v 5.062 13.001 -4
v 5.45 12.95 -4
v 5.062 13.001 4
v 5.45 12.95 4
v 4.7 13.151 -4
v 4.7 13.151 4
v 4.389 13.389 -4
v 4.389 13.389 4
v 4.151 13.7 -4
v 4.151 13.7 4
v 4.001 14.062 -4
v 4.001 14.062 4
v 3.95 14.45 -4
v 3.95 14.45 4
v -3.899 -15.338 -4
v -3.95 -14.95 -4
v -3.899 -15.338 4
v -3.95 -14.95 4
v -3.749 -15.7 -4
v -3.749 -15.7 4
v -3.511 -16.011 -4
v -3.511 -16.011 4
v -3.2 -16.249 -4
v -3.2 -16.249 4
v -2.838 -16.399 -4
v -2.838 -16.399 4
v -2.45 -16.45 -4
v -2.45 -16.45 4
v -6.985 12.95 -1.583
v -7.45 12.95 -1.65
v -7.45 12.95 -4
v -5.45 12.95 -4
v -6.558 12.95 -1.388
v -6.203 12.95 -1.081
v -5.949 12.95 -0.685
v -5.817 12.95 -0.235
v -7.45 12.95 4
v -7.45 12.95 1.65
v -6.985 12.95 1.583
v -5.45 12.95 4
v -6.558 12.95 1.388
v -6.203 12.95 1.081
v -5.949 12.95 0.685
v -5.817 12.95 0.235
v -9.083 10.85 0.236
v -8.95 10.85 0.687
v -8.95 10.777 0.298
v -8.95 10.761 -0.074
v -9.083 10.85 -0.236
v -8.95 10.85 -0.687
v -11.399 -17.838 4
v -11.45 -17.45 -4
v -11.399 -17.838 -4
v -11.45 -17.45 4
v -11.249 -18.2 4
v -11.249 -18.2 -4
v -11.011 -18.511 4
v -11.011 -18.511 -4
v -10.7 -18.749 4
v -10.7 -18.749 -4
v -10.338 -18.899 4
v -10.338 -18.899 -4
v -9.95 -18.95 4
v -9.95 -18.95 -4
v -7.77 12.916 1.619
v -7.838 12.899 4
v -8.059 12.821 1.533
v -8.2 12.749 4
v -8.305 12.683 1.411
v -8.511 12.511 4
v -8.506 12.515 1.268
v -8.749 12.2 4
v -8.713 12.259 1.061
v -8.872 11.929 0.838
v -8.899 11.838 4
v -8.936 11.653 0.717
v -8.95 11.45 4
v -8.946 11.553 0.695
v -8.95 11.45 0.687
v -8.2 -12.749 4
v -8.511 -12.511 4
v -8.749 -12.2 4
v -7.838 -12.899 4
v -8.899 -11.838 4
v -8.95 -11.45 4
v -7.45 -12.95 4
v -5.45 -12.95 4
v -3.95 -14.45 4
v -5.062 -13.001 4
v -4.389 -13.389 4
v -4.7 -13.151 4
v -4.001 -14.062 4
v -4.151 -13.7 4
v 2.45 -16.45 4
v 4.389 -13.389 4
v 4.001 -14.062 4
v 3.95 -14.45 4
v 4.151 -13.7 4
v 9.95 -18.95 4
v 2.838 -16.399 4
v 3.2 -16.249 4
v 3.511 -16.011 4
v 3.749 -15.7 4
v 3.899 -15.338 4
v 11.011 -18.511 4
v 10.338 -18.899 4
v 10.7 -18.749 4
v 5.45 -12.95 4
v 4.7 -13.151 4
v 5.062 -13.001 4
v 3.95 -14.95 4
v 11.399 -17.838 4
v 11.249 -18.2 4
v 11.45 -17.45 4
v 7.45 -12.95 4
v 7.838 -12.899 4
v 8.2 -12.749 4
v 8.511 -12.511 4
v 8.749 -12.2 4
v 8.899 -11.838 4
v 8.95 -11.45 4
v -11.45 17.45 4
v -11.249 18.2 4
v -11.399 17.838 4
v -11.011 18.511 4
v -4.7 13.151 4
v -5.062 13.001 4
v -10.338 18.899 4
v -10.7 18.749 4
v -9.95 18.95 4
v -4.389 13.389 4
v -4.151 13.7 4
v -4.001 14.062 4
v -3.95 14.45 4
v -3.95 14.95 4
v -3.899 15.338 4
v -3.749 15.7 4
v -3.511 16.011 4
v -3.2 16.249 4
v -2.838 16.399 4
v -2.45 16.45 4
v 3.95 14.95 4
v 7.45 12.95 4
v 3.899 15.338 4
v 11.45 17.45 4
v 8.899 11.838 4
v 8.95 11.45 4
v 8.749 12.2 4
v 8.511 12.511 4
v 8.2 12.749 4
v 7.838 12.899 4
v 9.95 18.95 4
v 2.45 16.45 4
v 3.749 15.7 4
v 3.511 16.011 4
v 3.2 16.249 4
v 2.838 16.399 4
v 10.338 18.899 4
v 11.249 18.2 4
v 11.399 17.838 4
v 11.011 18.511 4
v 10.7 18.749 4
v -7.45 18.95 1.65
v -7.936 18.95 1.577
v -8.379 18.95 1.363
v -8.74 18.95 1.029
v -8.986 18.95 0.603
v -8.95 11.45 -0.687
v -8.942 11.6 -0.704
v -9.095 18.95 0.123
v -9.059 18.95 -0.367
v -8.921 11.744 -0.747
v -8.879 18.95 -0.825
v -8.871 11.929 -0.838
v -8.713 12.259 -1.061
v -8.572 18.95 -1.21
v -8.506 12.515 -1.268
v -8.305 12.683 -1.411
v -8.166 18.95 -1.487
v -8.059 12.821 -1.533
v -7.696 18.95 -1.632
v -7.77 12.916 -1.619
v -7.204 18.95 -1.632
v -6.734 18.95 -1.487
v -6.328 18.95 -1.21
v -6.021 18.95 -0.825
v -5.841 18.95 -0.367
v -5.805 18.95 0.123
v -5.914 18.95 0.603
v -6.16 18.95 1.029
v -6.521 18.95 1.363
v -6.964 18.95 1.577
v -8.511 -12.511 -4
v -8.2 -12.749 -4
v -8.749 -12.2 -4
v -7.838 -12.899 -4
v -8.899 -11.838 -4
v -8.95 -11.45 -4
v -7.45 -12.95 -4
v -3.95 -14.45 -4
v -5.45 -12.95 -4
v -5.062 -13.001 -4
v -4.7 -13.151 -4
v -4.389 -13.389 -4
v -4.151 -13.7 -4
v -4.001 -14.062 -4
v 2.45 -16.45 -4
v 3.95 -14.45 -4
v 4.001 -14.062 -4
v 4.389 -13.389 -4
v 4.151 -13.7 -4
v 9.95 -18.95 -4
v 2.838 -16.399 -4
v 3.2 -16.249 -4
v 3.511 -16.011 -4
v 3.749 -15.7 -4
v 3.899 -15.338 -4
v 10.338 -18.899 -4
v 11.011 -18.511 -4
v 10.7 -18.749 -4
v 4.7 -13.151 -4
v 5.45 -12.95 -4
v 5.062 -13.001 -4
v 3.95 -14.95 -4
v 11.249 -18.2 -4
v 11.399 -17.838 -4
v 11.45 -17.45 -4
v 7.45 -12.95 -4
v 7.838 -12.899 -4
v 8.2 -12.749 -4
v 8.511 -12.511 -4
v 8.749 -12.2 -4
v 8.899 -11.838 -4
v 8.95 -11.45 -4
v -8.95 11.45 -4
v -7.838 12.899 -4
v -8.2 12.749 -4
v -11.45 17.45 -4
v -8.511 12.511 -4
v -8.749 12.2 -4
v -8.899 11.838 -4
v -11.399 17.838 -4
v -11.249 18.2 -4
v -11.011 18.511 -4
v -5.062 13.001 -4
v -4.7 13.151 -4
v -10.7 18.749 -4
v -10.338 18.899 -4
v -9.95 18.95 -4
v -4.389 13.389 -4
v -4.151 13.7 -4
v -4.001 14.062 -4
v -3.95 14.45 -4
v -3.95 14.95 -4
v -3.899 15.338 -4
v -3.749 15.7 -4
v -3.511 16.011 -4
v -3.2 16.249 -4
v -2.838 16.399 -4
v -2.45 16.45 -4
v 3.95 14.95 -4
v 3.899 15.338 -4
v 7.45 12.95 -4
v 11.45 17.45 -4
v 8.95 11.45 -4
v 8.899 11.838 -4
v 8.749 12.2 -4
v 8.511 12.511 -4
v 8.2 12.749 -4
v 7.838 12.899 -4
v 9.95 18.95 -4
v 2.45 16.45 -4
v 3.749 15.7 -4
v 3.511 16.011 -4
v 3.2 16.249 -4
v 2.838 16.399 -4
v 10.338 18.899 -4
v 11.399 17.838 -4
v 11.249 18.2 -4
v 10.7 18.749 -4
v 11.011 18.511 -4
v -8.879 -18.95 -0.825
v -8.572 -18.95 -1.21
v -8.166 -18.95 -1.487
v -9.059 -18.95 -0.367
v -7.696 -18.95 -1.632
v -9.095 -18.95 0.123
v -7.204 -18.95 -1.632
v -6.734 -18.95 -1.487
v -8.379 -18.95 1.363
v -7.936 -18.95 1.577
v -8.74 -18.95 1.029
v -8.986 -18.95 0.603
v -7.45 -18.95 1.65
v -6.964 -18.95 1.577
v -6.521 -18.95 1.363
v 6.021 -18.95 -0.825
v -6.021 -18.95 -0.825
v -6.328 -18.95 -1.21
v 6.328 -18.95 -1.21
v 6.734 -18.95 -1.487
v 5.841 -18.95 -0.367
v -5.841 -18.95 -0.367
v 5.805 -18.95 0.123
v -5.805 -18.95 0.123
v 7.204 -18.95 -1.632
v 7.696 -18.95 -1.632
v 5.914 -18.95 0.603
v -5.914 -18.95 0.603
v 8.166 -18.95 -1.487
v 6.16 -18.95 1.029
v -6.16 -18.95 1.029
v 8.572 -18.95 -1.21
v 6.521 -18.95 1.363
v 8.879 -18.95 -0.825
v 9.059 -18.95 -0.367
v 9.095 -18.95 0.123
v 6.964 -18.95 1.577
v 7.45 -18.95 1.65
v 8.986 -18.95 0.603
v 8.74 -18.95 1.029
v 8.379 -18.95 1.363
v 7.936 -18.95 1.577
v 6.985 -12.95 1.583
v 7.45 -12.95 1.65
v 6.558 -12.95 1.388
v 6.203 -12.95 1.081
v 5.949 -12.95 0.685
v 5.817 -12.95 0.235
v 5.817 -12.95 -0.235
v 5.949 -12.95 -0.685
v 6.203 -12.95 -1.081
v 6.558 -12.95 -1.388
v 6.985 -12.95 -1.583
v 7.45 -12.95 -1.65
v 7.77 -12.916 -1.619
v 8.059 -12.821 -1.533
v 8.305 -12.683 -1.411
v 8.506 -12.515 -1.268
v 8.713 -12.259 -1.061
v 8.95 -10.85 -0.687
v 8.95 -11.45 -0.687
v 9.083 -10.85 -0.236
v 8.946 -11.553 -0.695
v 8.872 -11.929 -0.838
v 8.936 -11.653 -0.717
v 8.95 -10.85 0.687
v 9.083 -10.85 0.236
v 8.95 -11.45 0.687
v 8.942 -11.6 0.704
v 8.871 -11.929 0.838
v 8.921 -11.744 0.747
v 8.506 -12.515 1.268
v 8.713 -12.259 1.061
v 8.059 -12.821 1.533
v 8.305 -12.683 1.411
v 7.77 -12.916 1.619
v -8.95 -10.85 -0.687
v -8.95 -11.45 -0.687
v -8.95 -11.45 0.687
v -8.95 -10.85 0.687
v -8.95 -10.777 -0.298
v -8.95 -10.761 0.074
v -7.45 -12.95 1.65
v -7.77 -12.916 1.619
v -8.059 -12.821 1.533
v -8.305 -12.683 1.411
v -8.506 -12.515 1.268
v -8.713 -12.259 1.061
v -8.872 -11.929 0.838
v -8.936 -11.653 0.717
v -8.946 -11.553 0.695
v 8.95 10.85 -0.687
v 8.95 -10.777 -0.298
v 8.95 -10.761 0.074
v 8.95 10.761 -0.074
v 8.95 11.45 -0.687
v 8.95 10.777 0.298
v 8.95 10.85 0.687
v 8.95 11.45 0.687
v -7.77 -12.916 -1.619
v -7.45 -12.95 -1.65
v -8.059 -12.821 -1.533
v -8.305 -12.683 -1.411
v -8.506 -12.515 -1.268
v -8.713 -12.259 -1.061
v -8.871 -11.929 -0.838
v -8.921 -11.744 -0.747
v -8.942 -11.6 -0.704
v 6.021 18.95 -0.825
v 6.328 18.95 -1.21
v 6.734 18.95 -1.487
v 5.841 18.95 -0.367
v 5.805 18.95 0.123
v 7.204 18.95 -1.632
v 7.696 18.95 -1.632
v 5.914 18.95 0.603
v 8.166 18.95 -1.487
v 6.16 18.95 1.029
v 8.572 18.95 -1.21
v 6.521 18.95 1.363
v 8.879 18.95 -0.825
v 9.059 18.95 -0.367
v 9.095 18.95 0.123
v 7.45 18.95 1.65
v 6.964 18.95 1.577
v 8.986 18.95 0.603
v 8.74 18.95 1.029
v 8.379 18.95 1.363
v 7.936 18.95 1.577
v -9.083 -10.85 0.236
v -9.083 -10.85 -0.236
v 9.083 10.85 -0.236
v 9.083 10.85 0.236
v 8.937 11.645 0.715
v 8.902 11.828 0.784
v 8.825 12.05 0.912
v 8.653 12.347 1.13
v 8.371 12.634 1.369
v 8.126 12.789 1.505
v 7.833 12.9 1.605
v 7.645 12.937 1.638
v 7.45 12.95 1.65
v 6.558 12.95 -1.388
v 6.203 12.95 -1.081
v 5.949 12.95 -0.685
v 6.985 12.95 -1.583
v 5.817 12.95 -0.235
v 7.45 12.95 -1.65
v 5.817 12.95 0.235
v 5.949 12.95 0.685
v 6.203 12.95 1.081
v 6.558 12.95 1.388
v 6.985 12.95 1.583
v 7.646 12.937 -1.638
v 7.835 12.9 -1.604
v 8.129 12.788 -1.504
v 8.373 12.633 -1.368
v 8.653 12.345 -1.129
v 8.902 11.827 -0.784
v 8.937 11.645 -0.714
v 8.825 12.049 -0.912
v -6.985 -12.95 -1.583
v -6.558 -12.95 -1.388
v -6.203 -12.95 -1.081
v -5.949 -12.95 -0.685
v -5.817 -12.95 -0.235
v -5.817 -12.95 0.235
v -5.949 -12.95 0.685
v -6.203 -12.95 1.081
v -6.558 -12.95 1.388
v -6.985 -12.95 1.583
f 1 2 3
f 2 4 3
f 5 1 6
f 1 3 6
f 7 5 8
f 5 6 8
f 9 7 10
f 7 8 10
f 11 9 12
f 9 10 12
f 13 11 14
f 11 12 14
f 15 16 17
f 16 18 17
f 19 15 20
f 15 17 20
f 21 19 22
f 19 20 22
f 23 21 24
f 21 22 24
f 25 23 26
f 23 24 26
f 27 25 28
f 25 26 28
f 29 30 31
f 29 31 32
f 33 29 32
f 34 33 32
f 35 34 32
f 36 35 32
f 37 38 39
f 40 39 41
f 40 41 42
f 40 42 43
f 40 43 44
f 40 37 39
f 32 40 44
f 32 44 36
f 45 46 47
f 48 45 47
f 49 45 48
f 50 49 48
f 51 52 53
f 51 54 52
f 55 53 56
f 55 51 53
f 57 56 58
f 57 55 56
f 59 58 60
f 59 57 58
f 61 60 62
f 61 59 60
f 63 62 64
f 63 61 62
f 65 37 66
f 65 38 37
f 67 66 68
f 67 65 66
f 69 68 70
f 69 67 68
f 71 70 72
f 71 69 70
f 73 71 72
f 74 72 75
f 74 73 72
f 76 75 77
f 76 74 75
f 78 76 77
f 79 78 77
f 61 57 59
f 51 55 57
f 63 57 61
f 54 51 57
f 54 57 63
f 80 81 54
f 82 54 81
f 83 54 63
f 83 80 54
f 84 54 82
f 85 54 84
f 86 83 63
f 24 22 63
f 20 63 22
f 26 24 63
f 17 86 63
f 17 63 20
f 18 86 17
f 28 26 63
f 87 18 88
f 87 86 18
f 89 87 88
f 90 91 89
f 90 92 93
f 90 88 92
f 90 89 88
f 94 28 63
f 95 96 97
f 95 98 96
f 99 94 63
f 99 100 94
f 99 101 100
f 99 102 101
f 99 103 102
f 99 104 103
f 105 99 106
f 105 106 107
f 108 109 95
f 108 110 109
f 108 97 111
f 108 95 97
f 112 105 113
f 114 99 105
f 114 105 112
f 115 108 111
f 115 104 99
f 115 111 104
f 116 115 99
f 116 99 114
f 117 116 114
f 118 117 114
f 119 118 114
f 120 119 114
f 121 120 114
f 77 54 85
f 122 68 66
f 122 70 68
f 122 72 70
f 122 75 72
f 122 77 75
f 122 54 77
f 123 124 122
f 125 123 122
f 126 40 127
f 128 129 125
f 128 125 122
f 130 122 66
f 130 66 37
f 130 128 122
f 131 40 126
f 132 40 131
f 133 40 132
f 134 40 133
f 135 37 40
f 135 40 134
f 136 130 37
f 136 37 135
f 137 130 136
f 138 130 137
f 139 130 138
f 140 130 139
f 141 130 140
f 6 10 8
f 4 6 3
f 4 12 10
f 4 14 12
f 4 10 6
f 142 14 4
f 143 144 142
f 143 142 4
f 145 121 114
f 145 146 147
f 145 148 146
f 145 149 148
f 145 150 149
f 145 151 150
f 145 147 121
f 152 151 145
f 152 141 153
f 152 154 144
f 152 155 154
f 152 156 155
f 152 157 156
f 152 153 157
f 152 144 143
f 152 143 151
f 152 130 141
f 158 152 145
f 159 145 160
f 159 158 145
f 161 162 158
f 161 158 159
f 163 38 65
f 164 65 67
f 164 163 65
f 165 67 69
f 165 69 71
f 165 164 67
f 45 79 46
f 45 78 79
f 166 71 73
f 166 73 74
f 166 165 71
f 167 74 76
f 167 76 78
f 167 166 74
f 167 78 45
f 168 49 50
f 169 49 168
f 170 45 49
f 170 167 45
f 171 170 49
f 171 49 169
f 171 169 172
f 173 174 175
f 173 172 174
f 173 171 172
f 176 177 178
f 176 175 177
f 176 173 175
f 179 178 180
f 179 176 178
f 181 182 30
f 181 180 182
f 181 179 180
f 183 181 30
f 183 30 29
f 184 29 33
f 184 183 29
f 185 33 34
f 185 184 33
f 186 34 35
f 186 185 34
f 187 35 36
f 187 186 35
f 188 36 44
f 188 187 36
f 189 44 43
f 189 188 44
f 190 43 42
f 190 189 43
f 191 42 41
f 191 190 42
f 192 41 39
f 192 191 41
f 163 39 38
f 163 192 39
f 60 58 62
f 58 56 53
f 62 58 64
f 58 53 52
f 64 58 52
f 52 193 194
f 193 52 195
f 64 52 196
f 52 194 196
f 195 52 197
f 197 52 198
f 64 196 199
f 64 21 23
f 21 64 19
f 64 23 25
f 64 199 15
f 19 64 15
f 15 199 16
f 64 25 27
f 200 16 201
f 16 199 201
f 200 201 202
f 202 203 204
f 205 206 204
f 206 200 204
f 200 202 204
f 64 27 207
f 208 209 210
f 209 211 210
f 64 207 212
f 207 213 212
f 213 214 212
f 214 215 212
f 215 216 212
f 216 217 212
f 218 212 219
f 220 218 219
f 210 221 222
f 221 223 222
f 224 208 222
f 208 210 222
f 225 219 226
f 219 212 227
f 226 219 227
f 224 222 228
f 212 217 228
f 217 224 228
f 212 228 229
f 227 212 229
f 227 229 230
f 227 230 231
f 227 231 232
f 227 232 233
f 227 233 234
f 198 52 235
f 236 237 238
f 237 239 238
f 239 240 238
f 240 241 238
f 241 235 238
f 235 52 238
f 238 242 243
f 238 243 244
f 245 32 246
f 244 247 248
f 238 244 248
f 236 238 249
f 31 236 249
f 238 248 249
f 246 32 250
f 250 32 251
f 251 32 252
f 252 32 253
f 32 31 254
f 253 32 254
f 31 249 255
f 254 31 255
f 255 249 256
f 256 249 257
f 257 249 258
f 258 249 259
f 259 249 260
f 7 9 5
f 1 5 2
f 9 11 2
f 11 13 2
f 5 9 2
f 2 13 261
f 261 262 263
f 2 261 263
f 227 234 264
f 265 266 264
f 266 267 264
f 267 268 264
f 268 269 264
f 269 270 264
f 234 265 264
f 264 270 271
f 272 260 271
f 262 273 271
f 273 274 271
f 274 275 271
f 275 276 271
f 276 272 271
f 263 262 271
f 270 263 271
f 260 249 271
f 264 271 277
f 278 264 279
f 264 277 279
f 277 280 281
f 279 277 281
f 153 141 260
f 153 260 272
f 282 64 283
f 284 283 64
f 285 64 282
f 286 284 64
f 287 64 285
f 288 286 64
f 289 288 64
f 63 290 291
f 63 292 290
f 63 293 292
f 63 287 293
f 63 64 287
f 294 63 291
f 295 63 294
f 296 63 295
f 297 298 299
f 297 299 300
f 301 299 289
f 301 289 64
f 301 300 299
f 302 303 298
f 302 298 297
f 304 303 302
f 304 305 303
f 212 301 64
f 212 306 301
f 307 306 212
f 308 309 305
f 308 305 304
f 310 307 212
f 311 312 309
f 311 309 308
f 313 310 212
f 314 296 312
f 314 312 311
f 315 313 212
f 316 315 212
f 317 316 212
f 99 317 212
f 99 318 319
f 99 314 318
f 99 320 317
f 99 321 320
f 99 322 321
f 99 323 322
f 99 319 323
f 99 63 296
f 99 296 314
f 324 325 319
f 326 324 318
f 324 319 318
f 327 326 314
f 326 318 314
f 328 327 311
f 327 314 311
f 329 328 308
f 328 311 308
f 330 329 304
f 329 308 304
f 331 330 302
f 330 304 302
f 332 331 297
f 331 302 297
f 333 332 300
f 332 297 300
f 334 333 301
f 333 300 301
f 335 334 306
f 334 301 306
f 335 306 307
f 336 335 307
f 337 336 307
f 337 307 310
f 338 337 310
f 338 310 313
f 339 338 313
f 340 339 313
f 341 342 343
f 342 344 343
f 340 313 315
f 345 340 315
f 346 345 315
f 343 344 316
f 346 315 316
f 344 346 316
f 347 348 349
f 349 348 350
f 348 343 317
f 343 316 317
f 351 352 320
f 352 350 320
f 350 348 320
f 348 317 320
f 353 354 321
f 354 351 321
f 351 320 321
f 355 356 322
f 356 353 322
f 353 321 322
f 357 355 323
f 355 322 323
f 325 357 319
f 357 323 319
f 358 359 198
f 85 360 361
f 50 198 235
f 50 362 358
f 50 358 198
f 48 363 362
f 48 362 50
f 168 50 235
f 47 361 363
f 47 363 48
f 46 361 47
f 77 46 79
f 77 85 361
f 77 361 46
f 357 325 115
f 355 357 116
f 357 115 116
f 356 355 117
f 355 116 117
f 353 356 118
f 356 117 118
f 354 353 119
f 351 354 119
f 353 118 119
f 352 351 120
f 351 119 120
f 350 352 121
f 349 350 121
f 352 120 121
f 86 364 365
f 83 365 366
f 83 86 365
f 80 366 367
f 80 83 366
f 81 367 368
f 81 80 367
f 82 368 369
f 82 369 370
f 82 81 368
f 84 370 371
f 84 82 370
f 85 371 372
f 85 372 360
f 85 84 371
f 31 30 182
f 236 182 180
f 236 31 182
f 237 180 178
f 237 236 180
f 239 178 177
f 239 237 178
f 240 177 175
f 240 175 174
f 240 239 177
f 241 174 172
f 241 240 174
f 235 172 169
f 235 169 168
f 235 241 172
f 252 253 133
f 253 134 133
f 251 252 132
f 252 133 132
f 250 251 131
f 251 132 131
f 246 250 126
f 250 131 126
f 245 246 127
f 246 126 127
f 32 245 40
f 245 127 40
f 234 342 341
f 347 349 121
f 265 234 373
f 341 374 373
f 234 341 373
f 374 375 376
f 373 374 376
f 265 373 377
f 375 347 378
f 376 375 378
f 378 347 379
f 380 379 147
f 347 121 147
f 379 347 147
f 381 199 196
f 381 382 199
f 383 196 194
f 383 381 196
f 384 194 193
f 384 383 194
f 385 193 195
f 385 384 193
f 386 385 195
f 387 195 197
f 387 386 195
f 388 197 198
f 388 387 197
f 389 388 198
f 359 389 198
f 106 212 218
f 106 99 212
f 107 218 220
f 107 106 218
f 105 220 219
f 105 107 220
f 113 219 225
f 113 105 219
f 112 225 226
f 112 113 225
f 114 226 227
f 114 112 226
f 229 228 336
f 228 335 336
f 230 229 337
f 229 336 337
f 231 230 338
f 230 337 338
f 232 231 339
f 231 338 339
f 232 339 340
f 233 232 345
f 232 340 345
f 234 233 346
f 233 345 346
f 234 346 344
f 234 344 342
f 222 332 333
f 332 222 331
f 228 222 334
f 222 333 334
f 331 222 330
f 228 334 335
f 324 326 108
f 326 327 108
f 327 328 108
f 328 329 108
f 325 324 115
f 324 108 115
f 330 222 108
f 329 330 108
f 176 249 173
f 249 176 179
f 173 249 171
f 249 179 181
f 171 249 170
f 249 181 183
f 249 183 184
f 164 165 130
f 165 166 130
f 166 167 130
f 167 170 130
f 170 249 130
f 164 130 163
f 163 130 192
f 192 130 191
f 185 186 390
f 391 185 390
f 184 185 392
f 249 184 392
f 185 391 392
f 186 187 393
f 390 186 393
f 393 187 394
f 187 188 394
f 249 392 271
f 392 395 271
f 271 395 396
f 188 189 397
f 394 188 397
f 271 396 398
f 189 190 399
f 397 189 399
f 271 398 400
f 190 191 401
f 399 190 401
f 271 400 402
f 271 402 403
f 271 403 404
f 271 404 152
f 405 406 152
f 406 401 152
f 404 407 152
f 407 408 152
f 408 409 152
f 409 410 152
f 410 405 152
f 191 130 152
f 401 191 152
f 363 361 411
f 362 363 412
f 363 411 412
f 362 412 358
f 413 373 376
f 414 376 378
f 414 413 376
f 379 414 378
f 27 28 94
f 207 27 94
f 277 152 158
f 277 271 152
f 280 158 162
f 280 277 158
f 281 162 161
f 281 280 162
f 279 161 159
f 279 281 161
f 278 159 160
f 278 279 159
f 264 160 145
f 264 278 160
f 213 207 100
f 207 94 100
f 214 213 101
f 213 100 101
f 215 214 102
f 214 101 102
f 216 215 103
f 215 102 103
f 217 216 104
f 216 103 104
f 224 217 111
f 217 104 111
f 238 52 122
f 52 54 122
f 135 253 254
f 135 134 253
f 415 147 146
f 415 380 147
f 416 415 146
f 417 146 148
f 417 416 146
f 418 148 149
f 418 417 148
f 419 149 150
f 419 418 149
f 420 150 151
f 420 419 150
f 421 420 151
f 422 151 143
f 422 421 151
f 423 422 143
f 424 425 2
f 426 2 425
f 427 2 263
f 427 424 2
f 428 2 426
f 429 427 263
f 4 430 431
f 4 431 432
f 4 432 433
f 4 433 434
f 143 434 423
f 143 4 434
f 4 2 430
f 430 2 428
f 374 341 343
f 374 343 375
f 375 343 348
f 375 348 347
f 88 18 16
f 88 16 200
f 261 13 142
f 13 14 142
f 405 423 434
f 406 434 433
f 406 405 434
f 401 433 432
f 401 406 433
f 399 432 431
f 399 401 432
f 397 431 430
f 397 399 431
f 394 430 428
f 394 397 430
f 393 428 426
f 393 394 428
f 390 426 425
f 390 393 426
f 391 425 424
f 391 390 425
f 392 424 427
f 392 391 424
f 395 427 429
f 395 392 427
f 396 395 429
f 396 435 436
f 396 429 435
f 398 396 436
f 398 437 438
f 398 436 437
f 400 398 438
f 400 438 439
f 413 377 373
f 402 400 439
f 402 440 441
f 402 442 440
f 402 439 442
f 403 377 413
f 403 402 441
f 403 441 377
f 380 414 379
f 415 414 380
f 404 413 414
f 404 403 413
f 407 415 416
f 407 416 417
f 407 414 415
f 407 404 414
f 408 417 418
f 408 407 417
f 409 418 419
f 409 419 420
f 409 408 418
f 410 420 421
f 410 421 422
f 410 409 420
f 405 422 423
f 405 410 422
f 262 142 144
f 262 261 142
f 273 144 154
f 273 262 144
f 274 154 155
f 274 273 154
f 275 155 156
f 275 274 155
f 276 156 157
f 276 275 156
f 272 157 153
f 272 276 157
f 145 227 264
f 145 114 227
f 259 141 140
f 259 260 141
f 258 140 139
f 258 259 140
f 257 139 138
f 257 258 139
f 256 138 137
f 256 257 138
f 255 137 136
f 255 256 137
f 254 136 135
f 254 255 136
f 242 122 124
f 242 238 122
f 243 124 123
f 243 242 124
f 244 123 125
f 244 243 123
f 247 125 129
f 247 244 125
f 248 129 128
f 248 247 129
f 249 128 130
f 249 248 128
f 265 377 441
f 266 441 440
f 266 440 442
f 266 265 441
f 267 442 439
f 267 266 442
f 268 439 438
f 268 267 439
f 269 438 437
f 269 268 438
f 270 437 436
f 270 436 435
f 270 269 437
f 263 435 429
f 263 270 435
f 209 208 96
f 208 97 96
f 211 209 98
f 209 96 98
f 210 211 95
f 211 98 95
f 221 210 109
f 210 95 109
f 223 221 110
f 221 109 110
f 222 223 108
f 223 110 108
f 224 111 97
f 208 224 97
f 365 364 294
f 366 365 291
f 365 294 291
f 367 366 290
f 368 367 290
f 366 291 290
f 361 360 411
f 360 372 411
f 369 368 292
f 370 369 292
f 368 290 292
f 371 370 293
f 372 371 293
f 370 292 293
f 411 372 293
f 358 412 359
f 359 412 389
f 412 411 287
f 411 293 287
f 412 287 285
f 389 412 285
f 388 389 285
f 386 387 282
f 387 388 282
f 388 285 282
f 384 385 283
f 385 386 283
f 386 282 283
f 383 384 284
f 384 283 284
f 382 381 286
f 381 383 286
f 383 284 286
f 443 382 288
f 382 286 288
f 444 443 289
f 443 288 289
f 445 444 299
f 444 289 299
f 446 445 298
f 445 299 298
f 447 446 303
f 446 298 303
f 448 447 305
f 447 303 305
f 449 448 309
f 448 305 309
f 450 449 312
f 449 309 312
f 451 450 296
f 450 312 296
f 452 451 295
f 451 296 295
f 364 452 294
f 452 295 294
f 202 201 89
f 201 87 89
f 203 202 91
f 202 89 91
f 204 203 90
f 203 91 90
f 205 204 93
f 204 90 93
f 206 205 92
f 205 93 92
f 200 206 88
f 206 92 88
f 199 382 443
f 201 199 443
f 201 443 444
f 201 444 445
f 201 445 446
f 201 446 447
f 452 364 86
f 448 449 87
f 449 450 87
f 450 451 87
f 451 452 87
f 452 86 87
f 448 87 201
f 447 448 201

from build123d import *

# Parameters (mm, degrees)
SKETCH_1_W                  = 22.9
SKETCH_1_H                  = 37.9
EXTRUDE_1_DEPTH             = 4
HOLE_WIZARD_M4_1_AT_2_COUNT = 2
HOLE_WIZARD_M4_1_AT_2_PITCH = 14.9
SKETCH_6_W                  = 17.9
SKETCH_6_H                  = 25.9
CUT_EXTRUDE_1_DEPTH         = 19
SKETCH_7_W                  = 7.9
SKETCH_7_H                  = 32.9
CUT_EXTRUDE_2_DEPTH         = 19
FILLET_1_R                  = 1.5
FILLET_2_R                  = 1.5


with BuildPart() as part:
    # 草图1 → 凸台-拉伸1 (new, symmetric)
    with BuildSketch(Plane.XY):
        Rectangle(SKETCH_1_W, SKETCH_1_H)
    extrude(amount=EXTRUDE_1_DEPTH, both=True)

    # 草图5 → M4 螺纹孔1 (revolve, cut)
    with BuildSketch(Plane(origin=(-7.45, 18.95, 0), x_dir=(0, 0, 1), z_dir=(1, 0, 0))):
        Polygon((0, 0), (0, 9.091420021), (1.65, 8.1), (1.65, 0), align=None)
    hole_wizard_m4_1 = revolve(axis=Axis((-7.45, 25.3, 0), (0, -1, 0)), mode=Mode.SUBTRACT)

    # M4 螺纹孔1 at 2: M4 螺纹孔1 ×2
    with Locations(*[(i * HOLE_WIZARD_M4_1_AT_2_PITCH, 0, 0) for i in range(1, HOLE_WIZARD_M4_1_AT_2_COUNT)]):
        add(hole_wizard_m4_1, mode=Mode.SUBTRACT)

    # 镜向1: M4 螺纹孔1 across plane
    add(hole_wizard_m4_1.mirror(Plane.ZX), mode=Mode.SUBTRACT)

    # 镜向1 copy 1 sketch → 镜向1 copy 1 (revolve, cut)
    with BuildSketch(Plane(origin=(7.45, -18.95, 0), x_dir=(0, 0, 1), z_dir=(1, 0, 0))):
        Polygon((0, 0), (0, -9.091420021), (1.65, -8.1), (1.65, 0), align=None)
    revolve(axis=Axis((7.45, -25.3, 0), (0, -1, 0)), mode=Mode.SUBTRACT)

    # 草图6 → 切除-拉伸1 (cut, symmetric)
    with BuildSketch(Plane.XY.offset(4)):
        Rectangle(SKETCH_6_W, SKETCH_6_H)
    extrude(amount=CUT_EXTRUDE_1_DEPTH, both=True, mode=Mode.SUBTRACT)

    # 草图7 → 切除-拉伸2 (cut, symmetric)
    with BuildSketch(Plane.XY.offset(4)):
        Rectangle(SKETCH_7_W, SKETCH_7_H)
    extrude(amount=CUT_EXTRUDE_2_DEPTH, both=True, mode=Mode.SUBTRACT)

    # 圆角1
    fillet_1_edges = [part.edges().sort_by_distance(p)[0] for p in [
        (-8.95, 12.95, 2.343693177),
        (-8.95, 12.95, -2.343693177),
        (8.95, 12.95, 2.343693177),
        (8.95, 12.95, -2.343693177),
        (8.95, -12.95, 2.343693177),
        (8.95, -12.95, -2.343693177),
        (-8.95, -12.95, 2.343693177),
        (-8.95, -12.95, -2.343693177),
        (-3.95, -12.95, 0),
        (3.95, -12.95, 0),
        (3.95, -16.45, 0),
        (-3.95, 16.45, 0),
        (3.95, 16.45, 0),
        (3.95, 12.95, 0),
        (-3.95, 12.95, 0),
        (-3.95, -16.45, 0),
    ]]
    fillet(fillet_1_edges, radius=FILLET_1_R)

    # 圆角2
    fillet_2_edges = [part.edges().sort_by_distance(p)[0] for p in [
        (11.45, -18.95, 0),
        (-11.45, -18.95, 0),
        (-11.45, 18.95, 0),
        (11.45, 18.95, 0),
    ]]
    fillet(fillet_2_edges, radius=FILLET_2_R)


solid = part.part
